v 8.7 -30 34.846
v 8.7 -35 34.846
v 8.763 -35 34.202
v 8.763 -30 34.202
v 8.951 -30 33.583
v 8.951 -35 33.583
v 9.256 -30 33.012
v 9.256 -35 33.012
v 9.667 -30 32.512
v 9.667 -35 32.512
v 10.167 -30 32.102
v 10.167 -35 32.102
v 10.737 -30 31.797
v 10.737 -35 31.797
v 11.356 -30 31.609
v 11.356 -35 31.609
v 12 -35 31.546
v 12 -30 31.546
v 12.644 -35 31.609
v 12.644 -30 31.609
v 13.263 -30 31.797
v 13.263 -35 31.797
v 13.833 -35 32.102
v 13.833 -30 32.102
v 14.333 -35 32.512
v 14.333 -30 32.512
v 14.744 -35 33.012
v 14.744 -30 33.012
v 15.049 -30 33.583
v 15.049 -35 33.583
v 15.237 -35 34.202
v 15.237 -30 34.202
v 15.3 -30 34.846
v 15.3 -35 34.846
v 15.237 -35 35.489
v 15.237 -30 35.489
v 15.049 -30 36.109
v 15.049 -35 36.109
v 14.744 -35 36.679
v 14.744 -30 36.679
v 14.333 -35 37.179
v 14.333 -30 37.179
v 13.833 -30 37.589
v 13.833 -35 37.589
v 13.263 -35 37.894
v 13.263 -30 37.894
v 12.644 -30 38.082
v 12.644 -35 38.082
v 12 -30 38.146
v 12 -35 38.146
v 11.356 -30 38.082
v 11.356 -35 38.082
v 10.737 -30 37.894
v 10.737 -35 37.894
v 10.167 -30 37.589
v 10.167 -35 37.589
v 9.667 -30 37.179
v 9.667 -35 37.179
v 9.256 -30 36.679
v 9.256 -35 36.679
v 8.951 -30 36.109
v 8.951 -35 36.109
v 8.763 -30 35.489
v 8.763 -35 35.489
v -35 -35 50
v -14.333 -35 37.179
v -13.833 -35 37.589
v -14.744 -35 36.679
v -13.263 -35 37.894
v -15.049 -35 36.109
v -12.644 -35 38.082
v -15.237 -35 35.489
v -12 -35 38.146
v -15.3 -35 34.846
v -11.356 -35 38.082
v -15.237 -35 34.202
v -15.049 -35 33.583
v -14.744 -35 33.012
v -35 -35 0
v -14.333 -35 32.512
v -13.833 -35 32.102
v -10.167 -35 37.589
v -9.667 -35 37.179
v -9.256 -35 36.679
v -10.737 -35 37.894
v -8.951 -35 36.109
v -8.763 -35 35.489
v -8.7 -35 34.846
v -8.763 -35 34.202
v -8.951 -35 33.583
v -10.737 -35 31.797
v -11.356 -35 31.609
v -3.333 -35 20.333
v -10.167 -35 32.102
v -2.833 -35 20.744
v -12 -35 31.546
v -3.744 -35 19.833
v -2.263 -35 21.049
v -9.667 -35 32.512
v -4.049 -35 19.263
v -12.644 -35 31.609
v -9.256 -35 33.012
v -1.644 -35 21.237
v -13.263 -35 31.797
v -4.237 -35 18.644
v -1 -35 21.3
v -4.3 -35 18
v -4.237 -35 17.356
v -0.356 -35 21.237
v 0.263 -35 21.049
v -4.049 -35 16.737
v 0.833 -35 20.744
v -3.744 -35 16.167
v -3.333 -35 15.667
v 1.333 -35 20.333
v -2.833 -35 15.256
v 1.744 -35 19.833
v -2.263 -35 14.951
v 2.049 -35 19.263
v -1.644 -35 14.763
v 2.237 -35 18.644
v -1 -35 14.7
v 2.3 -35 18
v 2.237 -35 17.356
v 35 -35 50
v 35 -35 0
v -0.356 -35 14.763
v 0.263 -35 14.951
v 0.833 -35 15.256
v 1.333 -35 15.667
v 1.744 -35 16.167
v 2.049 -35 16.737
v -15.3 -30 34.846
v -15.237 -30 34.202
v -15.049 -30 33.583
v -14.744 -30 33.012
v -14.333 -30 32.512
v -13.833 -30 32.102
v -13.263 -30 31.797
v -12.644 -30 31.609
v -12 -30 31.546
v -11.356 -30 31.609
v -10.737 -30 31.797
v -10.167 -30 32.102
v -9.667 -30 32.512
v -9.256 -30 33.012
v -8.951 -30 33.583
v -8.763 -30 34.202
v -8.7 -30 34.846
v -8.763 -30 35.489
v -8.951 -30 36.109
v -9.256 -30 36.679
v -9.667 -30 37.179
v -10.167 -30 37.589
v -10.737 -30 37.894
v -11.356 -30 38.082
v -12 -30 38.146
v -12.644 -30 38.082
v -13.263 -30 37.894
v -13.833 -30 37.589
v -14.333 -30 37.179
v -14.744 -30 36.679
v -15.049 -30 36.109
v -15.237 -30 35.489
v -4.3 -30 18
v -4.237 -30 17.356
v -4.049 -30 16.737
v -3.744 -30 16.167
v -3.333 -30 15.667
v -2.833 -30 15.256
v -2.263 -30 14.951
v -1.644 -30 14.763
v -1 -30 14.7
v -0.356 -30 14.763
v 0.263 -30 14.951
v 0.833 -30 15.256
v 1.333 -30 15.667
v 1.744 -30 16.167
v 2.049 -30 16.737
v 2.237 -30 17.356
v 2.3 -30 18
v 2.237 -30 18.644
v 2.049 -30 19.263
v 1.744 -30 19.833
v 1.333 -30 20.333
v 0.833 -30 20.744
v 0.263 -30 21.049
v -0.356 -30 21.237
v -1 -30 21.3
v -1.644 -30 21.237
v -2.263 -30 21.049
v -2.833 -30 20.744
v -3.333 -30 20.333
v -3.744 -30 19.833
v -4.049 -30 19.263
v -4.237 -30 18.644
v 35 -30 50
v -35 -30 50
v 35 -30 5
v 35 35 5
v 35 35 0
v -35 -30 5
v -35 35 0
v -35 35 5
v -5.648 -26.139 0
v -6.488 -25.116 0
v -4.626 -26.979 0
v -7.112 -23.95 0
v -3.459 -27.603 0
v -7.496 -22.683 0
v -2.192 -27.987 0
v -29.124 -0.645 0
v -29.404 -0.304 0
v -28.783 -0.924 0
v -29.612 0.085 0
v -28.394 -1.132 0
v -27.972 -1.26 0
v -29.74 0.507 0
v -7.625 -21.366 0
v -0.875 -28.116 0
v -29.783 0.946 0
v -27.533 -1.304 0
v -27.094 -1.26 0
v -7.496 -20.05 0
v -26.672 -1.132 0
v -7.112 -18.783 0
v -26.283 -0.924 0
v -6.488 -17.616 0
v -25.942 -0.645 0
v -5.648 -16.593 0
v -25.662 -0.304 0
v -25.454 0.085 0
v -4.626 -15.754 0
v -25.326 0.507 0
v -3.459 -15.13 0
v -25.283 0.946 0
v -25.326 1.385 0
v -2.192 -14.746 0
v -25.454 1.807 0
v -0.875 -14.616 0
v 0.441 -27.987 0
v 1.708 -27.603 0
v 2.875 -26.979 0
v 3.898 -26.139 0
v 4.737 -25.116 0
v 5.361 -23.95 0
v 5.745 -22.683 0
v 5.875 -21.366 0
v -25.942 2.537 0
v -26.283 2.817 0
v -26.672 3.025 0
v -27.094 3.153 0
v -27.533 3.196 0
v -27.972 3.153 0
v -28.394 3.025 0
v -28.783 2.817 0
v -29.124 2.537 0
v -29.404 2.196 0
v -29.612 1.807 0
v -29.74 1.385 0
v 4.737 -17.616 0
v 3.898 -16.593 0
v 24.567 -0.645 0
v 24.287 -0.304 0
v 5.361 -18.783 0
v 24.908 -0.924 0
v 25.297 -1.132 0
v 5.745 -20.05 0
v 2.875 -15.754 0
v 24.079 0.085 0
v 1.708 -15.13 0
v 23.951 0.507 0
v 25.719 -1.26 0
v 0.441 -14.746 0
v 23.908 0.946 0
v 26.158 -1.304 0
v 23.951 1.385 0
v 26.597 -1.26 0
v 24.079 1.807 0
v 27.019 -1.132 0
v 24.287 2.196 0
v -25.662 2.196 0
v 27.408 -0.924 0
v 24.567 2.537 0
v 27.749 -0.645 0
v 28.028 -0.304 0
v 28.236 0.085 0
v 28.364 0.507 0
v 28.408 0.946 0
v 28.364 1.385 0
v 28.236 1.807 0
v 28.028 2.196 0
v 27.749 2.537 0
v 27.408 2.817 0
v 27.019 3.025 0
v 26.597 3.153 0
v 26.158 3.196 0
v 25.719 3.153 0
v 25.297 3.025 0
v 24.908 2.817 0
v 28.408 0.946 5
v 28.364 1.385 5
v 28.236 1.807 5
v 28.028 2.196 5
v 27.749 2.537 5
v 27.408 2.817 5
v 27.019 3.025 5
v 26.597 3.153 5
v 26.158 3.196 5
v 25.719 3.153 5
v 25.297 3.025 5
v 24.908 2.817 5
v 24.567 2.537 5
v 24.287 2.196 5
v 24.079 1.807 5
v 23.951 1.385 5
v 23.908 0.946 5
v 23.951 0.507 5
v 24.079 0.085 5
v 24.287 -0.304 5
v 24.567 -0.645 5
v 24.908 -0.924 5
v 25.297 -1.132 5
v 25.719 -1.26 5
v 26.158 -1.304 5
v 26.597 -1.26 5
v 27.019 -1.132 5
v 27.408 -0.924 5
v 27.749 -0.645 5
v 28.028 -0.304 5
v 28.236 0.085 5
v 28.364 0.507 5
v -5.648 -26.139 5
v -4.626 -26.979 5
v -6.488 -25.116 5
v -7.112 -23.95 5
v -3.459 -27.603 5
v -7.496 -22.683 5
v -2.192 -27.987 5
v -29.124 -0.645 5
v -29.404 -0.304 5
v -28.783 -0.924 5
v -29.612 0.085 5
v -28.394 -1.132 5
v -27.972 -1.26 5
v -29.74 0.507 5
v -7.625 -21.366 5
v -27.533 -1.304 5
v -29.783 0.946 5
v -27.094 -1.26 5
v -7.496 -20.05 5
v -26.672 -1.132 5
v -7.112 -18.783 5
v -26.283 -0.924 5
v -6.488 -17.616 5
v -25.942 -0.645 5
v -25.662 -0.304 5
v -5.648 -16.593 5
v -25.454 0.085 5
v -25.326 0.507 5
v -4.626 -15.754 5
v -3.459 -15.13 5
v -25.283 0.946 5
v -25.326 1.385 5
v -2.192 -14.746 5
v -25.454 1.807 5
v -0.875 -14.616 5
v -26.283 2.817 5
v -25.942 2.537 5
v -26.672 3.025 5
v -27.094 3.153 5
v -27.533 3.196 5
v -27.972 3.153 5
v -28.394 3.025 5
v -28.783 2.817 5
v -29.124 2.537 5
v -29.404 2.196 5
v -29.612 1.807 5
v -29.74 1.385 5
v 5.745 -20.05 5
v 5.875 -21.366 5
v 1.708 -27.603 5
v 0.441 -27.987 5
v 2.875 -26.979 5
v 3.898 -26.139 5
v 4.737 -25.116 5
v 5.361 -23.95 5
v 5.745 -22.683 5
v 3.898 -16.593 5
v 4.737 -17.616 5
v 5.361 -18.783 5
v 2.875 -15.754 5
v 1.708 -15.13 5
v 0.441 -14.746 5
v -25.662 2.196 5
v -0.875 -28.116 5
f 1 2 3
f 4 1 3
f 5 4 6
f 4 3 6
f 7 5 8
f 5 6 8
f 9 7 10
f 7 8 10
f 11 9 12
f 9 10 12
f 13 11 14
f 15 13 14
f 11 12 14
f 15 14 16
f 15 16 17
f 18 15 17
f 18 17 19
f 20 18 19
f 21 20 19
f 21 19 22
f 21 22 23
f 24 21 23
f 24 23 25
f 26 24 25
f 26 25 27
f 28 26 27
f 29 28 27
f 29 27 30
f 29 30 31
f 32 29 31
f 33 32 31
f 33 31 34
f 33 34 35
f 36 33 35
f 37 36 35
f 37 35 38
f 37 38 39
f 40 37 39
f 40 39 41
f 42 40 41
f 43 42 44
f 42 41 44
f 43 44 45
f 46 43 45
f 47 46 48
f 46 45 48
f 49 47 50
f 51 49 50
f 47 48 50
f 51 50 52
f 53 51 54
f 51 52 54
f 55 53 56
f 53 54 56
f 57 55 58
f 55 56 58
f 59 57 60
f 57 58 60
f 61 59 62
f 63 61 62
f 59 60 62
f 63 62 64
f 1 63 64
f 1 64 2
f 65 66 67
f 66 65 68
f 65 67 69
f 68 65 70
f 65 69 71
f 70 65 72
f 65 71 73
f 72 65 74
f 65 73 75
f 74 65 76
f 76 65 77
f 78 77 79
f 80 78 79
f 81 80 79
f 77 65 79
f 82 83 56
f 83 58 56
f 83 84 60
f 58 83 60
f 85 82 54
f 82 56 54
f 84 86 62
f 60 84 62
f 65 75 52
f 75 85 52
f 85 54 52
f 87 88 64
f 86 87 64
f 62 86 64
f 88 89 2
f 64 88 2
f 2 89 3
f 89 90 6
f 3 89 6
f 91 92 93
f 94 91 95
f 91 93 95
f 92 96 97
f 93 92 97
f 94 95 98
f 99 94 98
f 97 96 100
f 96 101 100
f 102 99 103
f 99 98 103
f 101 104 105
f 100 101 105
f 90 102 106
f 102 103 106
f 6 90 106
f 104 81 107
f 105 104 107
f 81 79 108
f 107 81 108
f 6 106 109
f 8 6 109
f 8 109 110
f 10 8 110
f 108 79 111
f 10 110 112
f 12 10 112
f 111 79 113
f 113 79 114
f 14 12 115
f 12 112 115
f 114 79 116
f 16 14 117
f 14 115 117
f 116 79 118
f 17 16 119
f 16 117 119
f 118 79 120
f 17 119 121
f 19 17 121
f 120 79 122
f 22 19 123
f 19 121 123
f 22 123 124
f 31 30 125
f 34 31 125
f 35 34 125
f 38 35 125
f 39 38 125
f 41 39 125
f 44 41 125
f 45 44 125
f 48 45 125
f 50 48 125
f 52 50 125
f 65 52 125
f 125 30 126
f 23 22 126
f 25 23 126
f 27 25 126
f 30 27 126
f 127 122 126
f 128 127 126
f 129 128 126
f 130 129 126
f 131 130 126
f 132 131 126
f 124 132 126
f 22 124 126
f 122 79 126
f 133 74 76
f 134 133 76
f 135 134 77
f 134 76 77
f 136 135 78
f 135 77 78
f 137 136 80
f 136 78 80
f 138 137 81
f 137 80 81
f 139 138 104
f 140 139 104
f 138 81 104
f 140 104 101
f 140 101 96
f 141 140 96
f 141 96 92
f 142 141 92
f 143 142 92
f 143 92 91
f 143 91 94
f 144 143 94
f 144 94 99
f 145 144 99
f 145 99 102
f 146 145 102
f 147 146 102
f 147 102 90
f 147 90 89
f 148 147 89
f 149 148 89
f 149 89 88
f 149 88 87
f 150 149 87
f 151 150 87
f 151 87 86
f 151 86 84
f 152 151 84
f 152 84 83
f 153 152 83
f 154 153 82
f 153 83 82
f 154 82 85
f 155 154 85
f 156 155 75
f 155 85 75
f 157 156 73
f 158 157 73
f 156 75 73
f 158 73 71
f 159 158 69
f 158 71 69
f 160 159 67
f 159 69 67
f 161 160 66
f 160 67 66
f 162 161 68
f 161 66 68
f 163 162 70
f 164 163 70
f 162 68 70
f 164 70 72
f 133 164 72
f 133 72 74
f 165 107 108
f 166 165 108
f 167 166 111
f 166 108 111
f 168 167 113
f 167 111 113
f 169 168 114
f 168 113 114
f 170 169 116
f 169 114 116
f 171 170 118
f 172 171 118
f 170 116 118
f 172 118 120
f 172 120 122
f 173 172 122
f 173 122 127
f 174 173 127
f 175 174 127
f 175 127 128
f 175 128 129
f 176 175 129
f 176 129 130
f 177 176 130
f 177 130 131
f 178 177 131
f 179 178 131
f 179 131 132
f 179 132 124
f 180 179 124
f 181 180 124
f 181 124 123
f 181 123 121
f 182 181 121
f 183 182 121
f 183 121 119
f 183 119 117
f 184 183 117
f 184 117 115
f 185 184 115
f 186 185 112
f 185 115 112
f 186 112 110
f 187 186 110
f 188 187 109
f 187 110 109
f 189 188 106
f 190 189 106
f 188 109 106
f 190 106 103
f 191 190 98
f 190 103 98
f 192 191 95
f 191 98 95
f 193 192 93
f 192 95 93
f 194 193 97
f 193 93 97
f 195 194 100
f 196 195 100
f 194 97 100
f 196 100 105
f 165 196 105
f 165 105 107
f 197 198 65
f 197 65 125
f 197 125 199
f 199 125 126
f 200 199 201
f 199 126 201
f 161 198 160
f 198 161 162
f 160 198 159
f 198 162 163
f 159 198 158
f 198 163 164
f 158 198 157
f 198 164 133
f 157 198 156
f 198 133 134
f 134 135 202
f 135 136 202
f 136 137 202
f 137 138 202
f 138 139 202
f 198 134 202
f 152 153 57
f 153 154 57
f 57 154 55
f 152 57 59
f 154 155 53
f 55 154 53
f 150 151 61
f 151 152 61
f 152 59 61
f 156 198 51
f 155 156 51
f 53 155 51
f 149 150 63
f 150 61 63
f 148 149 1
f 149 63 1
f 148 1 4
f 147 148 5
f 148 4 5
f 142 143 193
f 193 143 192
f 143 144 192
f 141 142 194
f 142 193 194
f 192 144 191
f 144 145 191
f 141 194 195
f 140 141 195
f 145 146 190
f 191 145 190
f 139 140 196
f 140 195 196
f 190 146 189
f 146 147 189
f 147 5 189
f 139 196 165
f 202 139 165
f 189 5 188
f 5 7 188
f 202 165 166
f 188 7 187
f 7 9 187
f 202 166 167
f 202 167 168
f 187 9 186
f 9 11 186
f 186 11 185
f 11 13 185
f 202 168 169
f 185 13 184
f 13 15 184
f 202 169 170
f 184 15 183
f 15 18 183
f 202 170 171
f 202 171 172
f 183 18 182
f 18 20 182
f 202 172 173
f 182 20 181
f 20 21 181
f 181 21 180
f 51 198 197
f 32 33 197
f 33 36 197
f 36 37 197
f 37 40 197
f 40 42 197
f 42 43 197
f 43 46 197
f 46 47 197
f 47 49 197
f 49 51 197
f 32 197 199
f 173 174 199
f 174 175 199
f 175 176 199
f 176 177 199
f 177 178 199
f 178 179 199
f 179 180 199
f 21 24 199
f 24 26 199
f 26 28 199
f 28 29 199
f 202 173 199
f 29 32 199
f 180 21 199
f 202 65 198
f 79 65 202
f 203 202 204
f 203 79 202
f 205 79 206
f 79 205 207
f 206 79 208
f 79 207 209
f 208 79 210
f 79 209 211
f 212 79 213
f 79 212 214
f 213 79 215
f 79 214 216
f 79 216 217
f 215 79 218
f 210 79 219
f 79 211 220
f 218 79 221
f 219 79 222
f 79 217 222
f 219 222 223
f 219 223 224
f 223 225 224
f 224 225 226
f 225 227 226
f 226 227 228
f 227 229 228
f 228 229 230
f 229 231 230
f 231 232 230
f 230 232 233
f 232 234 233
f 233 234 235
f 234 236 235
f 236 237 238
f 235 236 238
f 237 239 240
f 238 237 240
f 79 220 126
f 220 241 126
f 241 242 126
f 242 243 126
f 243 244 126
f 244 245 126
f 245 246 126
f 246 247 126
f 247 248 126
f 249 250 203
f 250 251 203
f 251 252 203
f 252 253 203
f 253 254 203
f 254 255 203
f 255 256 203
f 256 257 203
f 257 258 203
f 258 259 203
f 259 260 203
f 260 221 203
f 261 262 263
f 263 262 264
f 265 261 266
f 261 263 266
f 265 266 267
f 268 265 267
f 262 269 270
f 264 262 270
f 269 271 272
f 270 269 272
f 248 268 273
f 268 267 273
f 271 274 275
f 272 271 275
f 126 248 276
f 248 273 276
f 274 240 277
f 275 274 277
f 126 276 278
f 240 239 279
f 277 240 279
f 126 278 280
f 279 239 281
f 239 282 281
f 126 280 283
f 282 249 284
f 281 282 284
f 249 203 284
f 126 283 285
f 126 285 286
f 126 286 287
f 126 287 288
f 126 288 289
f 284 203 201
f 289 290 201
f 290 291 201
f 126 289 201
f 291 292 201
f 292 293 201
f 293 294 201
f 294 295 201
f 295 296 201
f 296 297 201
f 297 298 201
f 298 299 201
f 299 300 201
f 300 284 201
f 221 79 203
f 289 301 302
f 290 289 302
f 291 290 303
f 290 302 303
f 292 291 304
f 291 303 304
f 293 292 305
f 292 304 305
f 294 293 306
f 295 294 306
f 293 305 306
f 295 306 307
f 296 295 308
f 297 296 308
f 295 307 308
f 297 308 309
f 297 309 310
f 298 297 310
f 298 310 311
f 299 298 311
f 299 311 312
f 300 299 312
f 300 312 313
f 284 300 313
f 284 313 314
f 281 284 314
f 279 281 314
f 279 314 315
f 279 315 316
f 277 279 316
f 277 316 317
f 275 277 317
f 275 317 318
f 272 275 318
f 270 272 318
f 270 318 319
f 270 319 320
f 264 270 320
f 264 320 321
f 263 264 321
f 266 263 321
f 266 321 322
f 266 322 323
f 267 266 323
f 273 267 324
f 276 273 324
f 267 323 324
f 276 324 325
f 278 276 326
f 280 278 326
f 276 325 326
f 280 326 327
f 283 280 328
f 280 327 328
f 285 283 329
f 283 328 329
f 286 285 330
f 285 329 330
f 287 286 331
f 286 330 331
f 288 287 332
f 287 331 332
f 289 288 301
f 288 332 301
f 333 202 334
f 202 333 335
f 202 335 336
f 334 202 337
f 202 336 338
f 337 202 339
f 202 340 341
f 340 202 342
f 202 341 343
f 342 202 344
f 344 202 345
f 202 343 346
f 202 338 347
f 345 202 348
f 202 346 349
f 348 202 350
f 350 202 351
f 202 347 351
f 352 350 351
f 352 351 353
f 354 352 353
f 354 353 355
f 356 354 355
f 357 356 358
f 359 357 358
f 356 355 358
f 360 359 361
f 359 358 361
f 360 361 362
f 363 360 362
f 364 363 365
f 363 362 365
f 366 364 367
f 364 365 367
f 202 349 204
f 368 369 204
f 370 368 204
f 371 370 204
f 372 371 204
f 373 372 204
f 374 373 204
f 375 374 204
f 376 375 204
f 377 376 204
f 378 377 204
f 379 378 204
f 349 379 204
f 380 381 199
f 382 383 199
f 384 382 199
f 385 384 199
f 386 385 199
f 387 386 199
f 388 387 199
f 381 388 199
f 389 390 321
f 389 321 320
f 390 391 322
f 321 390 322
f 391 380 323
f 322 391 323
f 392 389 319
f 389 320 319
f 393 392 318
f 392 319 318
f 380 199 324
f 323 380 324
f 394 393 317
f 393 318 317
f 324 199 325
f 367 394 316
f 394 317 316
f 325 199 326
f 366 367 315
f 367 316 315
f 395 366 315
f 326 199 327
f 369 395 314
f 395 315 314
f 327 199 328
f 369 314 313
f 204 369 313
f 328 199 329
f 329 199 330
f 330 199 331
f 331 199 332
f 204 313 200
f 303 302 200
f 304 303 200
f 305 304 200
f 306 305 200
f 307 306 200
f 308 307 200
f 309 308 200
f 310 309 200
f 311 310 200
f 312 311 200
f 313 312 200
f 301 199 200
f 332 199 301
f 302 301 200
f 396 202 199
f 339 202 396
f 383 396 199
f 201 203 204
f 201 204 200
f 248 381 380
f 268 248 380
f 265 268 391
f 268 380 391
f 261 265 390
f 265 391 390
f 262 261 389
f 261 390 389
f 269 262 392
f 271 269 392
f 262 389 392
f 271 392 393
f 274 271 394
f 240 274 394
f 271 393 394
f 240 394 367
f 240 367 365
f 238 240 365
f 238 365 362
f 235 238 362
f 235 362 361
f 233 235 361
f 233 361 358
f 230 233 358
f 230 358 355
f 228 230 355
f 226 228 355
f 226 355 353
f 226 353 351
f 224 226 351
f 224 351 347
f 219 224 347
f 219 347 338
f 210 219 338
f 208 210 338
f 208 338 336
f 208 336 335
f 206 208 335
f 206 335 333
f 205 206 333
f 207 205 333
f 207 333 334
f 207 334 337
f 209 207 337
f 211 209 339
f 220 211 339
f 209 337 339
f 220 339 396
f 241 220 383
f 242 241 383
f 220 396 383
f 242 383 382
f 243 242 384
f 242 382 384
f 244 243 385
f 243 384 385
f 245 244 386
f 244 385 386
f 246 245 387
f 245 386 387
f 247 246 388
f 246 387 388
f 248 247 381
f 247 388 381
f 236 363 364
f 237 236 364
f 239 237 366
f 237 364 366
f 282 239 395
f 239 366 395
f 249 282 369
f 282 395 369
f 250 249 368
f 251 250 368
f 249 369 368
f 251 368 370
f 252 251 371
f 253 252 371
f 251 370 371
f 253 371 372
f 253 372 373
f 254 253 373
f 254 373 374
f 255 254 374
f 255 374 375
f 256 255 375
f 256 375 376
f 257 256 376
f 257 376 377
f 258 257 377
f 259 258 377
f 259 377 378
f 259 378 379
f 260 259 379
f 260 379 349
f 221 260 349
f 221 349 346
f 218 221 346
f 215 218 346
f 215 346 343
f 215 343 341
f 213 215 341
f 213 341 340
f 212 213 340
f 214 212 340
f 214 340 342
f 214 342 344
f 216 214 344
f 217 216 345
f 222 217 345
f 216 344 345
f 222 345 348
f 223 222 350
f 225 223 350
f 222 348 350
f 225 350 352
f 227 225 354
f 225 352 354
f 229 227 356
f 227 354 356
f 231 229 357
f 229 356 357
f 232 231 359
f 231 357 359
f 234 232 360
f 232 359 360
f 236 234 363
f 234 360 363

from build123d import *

# Parameters (mm, degrees)
ESQUISSE1_W             = 70
ESQUISSE1_H             = 70
BOSS_EXTRU_1_DEPTH      = 50
ESQUISSE2_W             = 123.137615707
ESQUISSE2_H             = 86.86411441
ENL_V_MAT_EXTRU_1_DEPTH = 217
D_GAGEMENT_M41_D        = 4.5
D_GAGEMENT_M121_D       = 13.5
M6_CLEARANCE_HOLE1_D    = 6.6


with BuildPart() as part:
    # Esquisse1 → Boss.-Extru.1 (new body)
    with BuildSketch(Plane.XY):
        Rectangle(ESQUISSE1_W, ESQUISSE1_H)
    extrude(amount=BOSS_EXTRU_1_DEPTH)

    # Esquisse2 → Enlèv. mat.-Extru.1 (cut)
    with BuildSketch(Plane(origin=(35, 0, 0), x_dir=(0, 0, -1), z_dir=(1, 0, 0))):
        with Locations((-66.568807854, 13.432057205)):
            Rectangle(ESQUISSE2_W, ESQUISSE2_H)
    extrude(amount=-ENL_V_MAT_EXTRU_1_DEPTH, mode=Mode.SUBTRACT)

    # Dégagement M41 (through all)
    with Locations(Plane(origin=(0, 0, 0), x_dir=(-1, 0, 0), z_dir=(0, 0, -1))):
        with Locations((-26.157577905, 0.946358973), (27.533117647, 0.946358973)):
            Hole(D_GAGEMENT_M41_D / 2)

    # Dégagement M121 (through all)
    with Locations(Plane(origin=(0, 0, 0), x_dir=(-1, 0, 0), z_dir=(0, 0, -1))):
        with Locations((0.875458958, -21.366395267)):
            Hole(D_GAGEMENT_M121_D / 2)

    # M6 Clearance Hole1 (through all)
    with Locations(Plane(origin=(0, -30, 0), x_dir=(1, 0, 0), z_dir=(0, 1, 0))):
        with Locations((-12, -34.845648012), (12, -34.845648012), (-1, -18)):
            Hole(M6_CLEARANCE_HOLE1_D / 2)


solid = part.part
